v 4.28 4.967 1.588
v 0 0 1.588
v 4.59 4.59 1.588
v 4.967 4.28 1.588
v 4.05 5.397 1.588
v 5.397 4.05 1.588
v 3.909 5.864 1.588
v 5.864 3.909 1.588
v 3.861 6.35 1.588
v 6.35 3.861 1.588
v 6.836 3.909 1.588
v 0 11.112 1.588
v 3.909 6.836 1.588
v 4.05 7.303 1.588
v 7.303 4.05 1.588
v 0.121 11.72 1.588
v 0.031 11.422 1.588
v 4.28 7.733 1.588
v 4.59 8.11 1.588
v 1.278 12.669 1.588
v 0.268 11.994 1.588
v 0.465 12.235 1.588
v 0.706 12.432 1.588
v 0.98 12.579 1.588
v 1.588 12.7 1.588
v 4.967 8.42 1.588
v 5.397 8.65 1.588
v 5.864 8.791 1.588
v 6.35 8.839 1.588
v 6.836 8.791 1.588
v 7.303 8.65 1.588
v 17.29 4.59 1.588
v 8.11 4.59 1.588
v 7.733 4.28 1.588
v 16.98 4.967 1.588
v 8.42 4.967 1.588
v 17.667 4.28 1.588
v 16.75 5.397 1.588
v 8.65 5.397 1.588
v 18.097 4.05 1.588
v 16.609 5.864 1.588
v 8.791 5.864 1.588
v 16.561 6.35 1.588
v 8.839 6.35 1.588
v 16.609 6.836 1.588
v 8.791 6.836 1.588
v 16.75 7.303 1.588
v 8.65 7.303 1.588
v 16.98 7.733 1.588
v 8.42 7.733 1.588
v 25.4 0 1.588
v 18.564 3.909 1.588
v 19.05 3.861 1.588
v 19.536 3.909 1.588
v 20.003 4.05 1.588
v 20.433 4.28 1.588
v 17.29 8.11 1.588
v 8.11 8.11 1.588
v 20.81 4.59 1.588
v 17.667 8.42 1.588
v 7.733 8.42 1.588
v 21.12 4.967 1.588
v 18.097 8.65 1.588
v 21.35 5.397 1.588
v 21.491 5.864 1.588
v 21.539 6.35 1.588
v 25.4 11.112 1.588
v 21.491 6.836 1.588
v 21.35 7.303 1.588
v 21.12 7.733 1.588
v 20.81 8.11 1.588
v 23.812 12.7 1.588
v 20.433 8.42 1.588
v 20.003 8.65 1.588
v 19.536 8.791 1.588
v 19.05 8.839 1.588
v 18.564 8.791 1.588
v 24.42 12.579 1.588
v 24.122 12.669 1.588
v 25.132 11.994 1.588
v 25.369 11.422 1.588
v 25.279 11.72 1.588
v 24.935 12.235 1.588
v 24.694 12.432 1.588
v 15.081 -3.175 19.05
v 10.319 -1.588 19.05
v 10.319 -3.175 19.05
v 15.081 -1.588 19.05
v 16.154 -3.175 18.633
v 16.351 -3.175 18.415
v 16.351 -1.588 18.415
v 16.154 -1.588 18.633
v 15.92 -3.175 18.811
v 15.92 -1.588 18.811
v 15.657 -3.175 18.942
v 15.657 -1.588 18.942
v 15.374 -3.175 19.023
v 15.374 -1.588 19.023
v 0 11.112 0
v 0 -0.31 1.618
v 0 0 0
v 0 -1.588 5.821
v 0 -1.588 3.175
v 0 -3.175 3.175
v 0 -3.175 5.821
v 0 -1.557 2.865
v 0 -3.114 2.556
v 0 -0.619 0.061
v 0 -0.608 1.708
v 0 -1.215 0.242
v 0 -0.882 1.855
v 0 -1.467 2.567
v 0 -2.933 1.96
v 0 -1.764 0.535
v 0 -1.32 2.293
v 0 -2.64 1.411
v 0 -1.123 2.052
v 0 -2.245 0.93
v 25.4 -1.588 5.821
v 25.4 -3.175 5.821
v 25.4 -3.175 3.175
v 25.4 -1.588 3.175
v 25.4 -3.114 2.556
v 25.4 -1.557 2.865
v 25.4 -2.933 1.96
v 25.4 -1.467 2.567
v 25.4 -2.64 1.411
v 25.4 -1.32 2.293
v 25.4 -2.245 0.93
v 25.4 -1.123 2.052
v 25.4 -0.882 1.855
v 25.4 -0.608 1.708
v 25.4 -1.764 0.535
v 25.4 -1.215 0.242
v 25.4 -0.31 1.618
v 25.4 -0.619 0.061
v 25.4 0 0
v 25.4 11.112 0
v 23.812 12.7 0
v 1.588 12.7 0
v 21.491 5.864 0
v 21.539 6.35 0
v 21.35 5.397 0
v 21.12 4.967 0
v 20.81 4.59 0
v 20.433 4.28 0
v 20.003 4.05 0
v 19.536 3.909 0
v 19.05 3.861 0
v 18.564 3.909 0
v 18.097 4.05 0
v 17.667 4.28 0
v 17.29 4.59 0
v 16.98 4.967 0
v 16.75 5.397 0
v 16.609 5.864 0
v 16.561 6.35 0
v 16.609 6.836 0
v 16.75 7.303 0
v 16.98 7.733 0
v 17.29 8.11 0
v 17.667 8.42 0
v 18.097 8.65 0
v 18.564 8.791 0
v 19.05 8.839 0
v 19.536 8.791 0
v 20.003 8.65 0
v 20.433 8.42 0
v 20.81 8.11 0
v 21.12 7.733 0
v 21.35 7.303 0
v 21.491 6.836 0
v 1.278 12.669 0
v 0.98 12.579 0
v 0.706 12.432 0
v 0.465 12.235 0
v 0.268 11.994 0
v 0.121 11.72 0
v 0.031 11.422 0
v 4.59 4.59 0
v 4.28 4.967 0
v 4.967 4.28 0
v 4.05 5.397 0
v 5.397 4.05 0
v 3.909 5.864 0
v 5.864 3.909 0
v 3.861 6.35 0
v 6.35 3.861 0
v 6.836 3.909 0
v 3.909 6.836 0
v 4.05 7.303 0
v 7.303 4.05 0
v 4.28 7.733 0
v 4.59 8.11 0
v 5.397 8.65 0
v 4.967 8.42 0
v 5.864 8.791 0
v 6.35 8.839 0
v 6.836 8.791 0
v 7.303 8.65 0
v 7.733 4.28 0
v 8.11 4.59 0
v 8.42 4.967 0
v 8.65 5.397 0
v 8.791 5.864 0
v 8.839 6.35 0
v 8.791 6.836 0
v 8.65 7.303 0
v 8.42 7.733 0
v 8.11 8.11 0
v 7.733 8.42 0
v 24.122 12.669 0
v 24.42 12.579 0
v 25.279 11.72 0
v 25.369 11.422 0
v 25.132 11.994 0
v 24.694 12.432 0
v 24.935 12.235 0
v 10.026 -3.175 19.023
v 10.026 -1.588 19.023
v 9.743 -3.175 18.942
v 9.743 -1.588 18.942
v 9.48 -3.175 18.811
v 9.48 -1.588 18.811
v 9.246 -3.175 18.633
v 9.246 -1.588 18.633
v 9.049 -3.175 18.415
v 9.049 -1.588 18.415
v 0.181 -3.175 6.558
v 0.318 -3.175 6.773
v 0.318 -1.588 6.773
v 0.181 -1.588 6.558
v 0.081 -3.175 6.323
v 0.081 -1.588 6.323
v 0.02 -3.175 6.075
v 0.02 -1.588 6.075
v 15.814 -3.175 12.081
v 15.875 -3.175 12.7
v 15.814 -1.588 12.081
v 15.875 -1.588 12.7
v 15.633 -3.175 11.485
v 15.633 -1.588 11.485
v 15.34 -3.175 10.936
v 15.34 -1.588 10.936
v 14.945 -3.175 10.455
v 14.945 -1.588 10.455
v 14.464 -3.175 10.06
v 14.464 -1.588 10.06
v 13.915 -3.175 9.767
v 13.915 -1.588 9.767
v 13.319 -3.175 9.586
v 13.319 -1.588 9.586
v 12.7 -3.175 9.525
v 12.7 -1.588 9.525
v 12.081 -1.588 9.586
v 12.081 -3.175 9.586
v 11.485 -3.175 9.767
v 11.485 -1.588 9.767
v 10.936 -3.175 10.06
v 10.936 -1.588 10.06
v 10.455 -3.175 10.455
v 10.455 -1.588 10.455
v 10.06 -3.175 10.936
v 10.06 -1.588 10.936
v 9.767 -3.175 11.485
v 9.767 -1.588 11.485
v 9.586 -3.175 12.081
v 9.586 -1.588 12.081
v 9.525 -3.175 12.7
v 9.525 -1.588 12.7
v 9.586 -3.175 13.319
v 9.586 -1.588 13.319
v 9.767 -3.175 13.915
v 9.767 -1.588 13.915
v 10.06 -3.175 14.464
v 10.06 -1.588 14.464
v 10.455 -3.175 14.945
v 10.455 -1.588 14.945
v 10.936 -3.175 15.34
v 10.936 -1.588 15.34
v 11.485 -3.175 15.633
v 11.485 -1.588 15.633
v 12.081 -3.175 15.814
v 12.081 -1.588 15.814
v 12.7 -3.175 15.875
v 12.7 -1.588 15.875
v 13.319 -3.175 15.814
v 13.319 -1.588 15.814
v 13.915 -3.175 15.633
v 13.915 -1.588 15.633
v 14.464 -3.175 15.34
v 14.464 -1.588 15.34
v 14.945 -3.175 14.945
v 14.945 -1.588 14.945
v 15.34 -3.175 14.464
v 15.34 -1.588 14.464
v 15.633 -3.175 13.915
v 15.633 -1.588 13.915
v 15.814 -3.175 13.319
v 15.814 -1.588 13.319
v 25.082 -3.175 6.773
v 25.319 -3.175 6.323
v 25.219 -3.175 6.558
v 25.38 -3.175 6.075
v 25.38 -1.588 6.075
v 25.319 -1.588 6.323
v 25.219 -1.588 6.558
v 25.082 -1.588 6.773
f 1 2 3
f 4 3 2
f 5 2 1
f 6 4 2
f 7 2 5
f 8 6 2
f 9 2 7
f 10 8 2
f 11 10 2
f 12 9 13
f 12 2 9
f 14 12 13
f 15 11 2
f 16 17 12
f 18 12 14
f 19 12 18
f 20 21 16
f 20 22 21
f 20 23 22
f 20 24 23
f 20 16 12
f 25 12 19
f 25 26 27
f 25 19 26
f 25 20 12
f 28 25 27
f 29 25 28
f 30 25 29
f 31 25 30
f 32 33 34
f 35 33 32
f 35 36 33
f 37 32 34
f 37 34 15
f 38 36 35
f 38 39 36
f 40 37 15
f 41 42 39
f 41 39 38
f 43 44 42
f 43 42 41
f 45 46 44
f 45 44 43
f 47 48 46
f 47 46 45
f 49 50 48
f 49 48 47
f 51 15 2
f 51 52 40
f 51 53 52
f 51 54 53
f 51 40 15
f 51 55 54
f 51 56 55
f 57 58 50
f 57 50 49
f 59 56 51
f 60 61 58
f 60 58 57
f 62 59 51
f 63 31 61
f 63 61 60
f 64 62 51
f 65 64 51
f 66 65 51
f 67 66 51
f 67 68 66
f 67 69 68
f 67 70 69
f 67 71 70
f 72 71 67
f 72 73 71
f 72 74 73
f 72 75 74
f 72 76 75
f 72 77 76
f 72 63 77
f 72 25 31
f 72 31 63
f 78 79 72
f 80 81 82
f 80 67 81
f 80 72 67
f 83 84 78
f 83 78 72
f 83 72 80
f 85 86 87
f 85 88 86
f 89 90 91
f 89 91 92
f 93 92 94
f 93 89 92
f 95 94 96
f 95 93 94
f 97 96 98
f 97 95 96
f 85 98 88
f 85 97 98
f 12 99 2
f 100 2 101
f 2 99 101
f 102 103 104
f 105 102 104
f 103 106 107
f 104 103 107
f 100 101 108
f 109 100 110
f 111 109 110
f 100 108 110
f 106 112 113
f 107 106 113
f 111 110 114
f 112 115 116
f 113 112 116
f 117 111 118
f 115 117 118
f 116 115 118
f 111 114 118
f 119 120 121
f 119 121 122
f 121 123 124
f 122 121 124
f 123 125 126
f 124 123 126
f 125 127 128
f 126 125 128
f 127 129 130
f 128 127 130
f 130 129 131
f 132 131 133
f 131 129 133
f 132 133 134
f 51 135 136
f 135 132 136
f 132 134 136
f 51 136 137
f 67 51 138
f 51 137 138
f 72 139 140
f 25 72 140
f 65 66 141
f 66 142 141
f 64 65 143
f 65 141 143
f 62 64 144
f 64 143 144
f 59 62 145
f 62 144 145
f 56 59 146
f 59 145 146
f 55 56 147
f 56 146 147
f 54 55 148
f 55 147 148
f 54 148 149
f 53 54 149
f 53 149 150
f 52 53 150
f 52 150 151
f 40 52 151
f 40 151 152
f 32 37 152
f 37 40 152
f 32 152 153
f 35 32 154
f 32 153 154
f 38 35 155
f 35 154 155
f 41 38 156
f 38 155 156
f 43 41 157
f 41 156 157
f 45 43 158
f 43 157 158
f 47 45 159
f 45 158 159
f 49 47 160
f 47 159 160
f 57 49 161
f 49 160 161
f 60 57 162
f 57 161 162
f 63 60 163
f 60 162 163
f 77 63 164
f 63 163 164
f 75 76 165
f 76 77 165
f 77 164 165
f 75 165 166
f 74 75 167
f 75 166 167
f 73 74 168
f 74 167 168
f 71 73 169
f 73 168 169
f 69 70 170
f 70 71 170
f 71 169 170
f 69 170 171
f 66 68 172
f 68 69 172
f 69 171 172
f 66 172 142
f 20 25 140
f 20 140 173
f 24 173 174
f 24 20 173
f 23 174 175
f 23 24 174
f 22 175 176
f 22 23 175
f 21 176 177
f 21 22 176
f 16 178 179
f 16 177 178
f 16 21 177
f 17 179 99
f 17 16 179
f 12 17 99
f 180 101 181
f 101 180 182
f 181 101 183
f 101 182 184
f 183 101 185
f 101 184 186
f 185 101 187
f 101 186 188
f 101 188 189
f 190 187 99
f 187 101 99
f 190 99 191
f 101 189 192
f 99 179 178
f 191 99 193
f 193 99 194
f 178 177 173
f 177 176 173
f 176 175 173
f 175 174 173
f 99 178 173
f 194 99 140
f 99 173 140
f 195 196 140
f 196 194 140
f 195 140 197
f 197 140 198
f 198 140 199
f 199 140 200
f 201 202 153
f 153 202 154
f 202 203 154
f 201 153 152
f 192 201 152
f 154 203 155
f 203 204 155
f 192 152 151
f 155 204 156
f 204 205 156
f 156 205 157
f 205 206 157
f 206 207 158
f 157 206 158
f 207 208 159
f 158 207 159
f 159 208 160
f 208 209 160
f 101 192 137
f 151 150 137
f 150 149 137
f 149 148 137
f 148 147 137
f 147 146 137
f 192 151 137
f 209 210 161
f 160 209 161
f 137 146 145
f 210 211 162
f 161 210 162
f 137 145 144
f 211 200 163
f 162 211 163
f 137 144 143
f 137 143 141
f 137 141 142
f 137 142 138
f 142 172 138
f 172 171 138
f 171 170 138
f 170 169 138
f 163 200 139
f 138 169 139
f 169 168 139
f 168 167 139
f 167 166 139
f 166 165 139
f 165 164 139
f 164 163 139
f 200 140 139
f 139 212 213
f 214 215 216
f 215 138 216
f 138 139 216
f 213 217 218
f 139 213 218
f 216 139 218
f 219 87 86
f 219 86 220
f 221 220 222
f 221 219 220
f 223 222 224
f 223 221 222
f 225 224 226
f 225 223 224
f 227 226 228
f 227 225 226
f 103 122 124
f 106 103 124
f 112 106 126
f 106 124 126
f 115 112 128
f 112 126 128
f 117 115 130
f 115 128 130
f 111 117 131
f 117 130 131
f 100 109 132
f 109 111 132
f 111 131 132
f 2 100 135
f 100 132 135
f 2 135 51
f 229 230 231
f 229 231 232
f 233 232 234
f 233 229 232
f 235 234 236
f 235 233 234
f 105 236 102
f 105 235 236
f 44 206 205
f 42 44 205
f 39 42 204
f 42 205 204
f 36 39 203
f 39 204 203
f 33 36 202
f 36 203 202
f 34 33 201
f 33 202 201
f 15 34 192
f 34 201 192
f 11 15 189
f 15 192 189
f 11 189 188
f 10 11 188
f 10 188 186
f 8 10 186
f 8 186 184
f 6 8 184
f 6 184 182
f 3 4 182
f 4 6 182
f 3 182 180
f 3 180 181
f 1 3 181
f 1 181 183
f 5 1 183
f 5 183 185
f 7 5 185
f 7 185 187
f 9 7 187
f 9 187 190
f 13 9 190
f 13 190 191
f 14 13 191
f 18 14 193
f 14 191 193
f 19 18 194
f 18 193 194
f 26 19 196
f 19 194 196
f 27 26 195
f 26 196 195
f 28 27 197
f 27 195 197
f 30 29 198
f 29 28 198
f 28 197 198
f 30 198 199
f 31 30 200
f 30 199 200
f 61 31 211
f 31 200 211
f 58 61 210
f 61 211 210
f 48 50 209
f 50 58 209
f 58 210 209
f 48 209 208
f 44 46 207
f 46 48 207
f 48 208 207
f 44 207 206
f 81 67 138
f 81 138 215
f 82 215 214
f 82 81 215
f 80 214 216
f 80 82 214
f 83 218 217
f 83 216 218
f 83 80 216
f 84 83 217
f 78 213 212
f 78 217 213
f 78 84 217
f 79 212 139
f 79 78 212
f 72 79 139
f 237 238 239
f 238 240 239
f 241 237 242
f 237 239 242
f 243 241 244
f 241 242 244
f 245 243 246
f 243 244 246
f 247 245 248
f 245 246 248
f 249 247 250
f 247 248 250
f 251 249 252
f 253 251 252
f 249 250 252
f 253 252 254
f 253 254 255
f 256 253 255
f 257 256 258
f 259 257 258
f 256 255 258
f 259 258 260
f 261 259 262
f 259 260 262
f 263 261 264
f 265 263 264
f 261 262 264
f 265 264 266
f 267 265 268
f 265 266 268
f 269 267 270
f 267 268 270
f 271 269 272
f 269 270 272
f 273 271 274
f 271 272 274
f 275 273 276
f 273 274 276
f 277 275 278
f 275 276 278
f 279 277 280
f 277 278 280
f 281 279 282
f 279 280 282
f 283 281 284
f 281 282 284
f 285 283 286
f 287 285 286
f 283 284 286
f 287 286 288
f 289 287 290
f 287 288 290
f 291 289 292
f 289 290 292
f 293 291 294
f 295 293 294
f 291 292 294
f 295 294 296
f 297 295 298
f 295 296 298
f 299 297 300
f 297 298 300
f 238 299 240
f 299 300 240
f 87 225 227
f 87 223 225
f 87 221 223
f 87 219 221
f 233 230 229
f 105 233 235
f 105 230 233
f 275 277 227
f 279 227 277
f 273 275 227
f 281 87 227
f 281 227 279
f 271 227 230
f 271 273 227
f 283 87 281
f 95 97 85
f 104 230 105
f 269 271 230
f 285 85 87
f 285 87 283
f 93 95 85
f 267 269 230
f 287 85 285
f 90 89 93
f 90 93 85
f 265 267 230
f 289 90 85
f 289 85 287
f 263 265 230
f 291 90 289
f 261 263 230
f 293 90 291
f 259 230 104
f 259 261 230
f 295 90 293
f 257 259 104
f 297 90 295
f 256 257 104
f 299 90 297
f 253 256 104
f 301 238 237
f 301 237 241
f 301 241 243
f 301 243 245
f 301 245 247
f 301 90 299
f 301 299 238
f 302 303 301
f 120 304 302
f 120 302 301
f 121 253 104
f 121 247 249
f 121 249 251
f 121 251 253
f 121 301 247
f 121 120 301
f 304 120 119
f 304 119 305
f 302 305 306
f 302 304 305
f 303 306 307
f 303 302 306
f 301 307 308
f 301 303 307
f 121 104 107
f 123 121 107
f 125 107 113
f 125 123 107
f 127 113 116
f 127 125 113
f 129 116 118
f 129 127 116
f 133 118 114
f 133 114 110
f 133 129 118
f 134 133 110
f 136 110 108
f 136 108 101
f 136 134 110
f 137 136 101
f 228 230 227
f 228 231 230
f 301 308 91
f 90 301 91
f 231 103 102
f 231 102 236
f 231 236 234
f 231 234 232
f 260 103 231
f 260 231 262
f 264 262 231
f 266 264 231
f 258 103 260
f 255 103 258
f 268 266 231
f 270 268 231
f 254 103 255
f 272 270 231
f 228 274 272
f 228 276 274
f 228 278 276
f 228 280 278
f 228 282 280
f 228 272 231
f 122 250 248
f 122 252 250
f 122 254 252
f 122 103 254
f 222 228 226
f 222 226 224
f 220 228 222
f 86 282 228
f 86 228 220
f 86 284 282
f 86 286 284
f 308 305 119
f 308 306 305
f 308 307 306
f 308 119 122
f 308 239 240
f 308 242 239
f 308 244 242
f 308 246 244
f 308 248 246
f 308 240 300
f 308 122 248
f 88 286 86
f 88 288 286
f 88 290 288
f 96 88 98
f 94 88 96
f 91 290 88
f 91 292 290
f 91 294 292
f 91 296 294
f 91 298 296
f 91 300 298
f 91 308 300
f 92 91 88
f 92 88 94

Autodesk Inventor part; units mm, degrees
ref_plane "YZ Plane" through (0, 0, 0) normal (1, 0, 0) x (0, 1, 0)
ref_plane "XZ Plane" through (0, 0, 0) normal (0, 1, 0) x (-1, 0, 0)
ref_plane "XY Plane" through (0, 0, 0) normal (0, 0, 1) x (1, 0, 0)
sketch "Sketch1" plane through (0, 0, 0) normal (0, 0, 1) x (1, 0, 0)
  line L0 (0, 0) -> (25.4, 0)
  line L1 (25.4, 0) -> (25.4, 12.7)
  line L2 (25.4, 12.7) -> (0, 12.7)
  line L3 (0, 12.7) -> (0, 0)
  circle A0 centre (6.35, 6.35) radius 2.4892
  circle A1 centre (19.05, 6.35) radius 2.4892
  line L4 (12.7, 12.7) -> (12.7, 0) construction
  dimension "d0" = 25.4
  dimension "d1" = 12.7
  dimension "d2" = 4.9784
  dimension "d3" = 4.9784
  dimension "d4" = 6.35
  dimension "d5" = 6.35
  dimension "d6" = 6.35
  dimension "d7" = 6.35
extrude "Plate1" add sketch "Sketch1" along normal blind 1.5875
sketch "Sketch2" plane through (25.4, -1.5875, 3.175) normal (0, -1, 0) x (1, 0, 0)
  line L0 (-25.4, 0) -> (0, 0)
  line L1 (0, 0) -> (0, 15.875)
  line L2 (0, 15.875) -> (-25.4, 15.875)
  line L3 (-25.4, 15.875) -> (-25.4, 0)
edge flange "Flange1" height 19.05 angle 90 thickness 1.5875 bend radius 1.5875 thickness toward (0, -1, 0) relief tear relief width 1.5875 relief depth 0.7937 edges at (12.7, 0, 1.5875) wall of the first edge with corners at (0, -1.5875, 3.175) (25.4, -1.5875, 3.175) (25.4, -1.5875, 19.05) (0, -1.5875, 19.05)
bend "Bend1"
corner "Corner1"
sketch "Sketch3" plane through (0, -1.5875, 19.05) normal (0, 1, 0) x (1, 0, 0)
  line L0 (25.4, 15.875) -> (0, 15.875) projected
  line L1 (0, 0) -> (0, 15.875) projected
  line L2 (0, 0) -> (25.4, 0) projected
  line L3 (25.4, 0) -> (25.4, 15.875) projected
  line L4 (0, 12.7) -> (9.525, 0)
  line L5 (12.7, 0) -> (12.7, 15.875) construction
  line L6 (25.4, 12.7) -> (15.875, 0)
  circle A0 centre (12.7, 6.35) radius 3.175
  line L7 (9.525, 0) -> (15.875, 0)
  line L8 (25.4, 12.7) -> (25.4, 15.875)
  point P0 (0, 19.05)
  dimension "d19" = 3.175
  dimension "d20" = 3.175
  dimension "d21" = 6.35
  dimension "d22" = 6.35
extrude "Extrusion1" cut sketch "Sketch3" against normal blind 25.4 contours L3 L2 L6 | L4 L2 L1 | A0
fillet "Fillet1" radius 1.5875 6 edges at (9.525, -2.3812, 19.05) (0, -2.3813, 6.35) (25.4, -2.3813, 6.35) (15.875, -2.3812, 19.05) (25.4, 12.7, 0.7937) (0, 12.7, 0.7937)
equation "\"d5\" = d4"
equation "\"d7\" = d6"
equation "\"d9\" = BendReliefWidth"
equation "\"d10\" = BendReliefDepth"
equation "\"d11\" = MinimumRemnant"
equation "\"d12\" = BendRadius"
equation "\"d15\" = BendRadius"
equation "\"d16\" = CornerReliefSize"
equation "\"d17\" = GapSize"
equation "\"d18\" = JacobiRadiusSize"
equation "\"BendRadius\" = Thickness"
equation "\"BendReliefWidth\" = Thickness"
equation "\"BendReliefDepth\" = 0.5 * Thickness"
equation "\"CornerReliefSize\" = 4 * Thickness"
equation "\"MinimumRemnant\" = 2 * Thickness"
equation "\"TransitionRadius\" = BendRadius"
equation "\"JacobiRadiusSize\" = BendRadius"
equation "\"GapSize\" = Thickness"
equation "\"d8\" = BendRadius"
equation "\"Thickness\" = 1.5875"
properties part number "Flange for Torsion Spring" material "Aluminum"
